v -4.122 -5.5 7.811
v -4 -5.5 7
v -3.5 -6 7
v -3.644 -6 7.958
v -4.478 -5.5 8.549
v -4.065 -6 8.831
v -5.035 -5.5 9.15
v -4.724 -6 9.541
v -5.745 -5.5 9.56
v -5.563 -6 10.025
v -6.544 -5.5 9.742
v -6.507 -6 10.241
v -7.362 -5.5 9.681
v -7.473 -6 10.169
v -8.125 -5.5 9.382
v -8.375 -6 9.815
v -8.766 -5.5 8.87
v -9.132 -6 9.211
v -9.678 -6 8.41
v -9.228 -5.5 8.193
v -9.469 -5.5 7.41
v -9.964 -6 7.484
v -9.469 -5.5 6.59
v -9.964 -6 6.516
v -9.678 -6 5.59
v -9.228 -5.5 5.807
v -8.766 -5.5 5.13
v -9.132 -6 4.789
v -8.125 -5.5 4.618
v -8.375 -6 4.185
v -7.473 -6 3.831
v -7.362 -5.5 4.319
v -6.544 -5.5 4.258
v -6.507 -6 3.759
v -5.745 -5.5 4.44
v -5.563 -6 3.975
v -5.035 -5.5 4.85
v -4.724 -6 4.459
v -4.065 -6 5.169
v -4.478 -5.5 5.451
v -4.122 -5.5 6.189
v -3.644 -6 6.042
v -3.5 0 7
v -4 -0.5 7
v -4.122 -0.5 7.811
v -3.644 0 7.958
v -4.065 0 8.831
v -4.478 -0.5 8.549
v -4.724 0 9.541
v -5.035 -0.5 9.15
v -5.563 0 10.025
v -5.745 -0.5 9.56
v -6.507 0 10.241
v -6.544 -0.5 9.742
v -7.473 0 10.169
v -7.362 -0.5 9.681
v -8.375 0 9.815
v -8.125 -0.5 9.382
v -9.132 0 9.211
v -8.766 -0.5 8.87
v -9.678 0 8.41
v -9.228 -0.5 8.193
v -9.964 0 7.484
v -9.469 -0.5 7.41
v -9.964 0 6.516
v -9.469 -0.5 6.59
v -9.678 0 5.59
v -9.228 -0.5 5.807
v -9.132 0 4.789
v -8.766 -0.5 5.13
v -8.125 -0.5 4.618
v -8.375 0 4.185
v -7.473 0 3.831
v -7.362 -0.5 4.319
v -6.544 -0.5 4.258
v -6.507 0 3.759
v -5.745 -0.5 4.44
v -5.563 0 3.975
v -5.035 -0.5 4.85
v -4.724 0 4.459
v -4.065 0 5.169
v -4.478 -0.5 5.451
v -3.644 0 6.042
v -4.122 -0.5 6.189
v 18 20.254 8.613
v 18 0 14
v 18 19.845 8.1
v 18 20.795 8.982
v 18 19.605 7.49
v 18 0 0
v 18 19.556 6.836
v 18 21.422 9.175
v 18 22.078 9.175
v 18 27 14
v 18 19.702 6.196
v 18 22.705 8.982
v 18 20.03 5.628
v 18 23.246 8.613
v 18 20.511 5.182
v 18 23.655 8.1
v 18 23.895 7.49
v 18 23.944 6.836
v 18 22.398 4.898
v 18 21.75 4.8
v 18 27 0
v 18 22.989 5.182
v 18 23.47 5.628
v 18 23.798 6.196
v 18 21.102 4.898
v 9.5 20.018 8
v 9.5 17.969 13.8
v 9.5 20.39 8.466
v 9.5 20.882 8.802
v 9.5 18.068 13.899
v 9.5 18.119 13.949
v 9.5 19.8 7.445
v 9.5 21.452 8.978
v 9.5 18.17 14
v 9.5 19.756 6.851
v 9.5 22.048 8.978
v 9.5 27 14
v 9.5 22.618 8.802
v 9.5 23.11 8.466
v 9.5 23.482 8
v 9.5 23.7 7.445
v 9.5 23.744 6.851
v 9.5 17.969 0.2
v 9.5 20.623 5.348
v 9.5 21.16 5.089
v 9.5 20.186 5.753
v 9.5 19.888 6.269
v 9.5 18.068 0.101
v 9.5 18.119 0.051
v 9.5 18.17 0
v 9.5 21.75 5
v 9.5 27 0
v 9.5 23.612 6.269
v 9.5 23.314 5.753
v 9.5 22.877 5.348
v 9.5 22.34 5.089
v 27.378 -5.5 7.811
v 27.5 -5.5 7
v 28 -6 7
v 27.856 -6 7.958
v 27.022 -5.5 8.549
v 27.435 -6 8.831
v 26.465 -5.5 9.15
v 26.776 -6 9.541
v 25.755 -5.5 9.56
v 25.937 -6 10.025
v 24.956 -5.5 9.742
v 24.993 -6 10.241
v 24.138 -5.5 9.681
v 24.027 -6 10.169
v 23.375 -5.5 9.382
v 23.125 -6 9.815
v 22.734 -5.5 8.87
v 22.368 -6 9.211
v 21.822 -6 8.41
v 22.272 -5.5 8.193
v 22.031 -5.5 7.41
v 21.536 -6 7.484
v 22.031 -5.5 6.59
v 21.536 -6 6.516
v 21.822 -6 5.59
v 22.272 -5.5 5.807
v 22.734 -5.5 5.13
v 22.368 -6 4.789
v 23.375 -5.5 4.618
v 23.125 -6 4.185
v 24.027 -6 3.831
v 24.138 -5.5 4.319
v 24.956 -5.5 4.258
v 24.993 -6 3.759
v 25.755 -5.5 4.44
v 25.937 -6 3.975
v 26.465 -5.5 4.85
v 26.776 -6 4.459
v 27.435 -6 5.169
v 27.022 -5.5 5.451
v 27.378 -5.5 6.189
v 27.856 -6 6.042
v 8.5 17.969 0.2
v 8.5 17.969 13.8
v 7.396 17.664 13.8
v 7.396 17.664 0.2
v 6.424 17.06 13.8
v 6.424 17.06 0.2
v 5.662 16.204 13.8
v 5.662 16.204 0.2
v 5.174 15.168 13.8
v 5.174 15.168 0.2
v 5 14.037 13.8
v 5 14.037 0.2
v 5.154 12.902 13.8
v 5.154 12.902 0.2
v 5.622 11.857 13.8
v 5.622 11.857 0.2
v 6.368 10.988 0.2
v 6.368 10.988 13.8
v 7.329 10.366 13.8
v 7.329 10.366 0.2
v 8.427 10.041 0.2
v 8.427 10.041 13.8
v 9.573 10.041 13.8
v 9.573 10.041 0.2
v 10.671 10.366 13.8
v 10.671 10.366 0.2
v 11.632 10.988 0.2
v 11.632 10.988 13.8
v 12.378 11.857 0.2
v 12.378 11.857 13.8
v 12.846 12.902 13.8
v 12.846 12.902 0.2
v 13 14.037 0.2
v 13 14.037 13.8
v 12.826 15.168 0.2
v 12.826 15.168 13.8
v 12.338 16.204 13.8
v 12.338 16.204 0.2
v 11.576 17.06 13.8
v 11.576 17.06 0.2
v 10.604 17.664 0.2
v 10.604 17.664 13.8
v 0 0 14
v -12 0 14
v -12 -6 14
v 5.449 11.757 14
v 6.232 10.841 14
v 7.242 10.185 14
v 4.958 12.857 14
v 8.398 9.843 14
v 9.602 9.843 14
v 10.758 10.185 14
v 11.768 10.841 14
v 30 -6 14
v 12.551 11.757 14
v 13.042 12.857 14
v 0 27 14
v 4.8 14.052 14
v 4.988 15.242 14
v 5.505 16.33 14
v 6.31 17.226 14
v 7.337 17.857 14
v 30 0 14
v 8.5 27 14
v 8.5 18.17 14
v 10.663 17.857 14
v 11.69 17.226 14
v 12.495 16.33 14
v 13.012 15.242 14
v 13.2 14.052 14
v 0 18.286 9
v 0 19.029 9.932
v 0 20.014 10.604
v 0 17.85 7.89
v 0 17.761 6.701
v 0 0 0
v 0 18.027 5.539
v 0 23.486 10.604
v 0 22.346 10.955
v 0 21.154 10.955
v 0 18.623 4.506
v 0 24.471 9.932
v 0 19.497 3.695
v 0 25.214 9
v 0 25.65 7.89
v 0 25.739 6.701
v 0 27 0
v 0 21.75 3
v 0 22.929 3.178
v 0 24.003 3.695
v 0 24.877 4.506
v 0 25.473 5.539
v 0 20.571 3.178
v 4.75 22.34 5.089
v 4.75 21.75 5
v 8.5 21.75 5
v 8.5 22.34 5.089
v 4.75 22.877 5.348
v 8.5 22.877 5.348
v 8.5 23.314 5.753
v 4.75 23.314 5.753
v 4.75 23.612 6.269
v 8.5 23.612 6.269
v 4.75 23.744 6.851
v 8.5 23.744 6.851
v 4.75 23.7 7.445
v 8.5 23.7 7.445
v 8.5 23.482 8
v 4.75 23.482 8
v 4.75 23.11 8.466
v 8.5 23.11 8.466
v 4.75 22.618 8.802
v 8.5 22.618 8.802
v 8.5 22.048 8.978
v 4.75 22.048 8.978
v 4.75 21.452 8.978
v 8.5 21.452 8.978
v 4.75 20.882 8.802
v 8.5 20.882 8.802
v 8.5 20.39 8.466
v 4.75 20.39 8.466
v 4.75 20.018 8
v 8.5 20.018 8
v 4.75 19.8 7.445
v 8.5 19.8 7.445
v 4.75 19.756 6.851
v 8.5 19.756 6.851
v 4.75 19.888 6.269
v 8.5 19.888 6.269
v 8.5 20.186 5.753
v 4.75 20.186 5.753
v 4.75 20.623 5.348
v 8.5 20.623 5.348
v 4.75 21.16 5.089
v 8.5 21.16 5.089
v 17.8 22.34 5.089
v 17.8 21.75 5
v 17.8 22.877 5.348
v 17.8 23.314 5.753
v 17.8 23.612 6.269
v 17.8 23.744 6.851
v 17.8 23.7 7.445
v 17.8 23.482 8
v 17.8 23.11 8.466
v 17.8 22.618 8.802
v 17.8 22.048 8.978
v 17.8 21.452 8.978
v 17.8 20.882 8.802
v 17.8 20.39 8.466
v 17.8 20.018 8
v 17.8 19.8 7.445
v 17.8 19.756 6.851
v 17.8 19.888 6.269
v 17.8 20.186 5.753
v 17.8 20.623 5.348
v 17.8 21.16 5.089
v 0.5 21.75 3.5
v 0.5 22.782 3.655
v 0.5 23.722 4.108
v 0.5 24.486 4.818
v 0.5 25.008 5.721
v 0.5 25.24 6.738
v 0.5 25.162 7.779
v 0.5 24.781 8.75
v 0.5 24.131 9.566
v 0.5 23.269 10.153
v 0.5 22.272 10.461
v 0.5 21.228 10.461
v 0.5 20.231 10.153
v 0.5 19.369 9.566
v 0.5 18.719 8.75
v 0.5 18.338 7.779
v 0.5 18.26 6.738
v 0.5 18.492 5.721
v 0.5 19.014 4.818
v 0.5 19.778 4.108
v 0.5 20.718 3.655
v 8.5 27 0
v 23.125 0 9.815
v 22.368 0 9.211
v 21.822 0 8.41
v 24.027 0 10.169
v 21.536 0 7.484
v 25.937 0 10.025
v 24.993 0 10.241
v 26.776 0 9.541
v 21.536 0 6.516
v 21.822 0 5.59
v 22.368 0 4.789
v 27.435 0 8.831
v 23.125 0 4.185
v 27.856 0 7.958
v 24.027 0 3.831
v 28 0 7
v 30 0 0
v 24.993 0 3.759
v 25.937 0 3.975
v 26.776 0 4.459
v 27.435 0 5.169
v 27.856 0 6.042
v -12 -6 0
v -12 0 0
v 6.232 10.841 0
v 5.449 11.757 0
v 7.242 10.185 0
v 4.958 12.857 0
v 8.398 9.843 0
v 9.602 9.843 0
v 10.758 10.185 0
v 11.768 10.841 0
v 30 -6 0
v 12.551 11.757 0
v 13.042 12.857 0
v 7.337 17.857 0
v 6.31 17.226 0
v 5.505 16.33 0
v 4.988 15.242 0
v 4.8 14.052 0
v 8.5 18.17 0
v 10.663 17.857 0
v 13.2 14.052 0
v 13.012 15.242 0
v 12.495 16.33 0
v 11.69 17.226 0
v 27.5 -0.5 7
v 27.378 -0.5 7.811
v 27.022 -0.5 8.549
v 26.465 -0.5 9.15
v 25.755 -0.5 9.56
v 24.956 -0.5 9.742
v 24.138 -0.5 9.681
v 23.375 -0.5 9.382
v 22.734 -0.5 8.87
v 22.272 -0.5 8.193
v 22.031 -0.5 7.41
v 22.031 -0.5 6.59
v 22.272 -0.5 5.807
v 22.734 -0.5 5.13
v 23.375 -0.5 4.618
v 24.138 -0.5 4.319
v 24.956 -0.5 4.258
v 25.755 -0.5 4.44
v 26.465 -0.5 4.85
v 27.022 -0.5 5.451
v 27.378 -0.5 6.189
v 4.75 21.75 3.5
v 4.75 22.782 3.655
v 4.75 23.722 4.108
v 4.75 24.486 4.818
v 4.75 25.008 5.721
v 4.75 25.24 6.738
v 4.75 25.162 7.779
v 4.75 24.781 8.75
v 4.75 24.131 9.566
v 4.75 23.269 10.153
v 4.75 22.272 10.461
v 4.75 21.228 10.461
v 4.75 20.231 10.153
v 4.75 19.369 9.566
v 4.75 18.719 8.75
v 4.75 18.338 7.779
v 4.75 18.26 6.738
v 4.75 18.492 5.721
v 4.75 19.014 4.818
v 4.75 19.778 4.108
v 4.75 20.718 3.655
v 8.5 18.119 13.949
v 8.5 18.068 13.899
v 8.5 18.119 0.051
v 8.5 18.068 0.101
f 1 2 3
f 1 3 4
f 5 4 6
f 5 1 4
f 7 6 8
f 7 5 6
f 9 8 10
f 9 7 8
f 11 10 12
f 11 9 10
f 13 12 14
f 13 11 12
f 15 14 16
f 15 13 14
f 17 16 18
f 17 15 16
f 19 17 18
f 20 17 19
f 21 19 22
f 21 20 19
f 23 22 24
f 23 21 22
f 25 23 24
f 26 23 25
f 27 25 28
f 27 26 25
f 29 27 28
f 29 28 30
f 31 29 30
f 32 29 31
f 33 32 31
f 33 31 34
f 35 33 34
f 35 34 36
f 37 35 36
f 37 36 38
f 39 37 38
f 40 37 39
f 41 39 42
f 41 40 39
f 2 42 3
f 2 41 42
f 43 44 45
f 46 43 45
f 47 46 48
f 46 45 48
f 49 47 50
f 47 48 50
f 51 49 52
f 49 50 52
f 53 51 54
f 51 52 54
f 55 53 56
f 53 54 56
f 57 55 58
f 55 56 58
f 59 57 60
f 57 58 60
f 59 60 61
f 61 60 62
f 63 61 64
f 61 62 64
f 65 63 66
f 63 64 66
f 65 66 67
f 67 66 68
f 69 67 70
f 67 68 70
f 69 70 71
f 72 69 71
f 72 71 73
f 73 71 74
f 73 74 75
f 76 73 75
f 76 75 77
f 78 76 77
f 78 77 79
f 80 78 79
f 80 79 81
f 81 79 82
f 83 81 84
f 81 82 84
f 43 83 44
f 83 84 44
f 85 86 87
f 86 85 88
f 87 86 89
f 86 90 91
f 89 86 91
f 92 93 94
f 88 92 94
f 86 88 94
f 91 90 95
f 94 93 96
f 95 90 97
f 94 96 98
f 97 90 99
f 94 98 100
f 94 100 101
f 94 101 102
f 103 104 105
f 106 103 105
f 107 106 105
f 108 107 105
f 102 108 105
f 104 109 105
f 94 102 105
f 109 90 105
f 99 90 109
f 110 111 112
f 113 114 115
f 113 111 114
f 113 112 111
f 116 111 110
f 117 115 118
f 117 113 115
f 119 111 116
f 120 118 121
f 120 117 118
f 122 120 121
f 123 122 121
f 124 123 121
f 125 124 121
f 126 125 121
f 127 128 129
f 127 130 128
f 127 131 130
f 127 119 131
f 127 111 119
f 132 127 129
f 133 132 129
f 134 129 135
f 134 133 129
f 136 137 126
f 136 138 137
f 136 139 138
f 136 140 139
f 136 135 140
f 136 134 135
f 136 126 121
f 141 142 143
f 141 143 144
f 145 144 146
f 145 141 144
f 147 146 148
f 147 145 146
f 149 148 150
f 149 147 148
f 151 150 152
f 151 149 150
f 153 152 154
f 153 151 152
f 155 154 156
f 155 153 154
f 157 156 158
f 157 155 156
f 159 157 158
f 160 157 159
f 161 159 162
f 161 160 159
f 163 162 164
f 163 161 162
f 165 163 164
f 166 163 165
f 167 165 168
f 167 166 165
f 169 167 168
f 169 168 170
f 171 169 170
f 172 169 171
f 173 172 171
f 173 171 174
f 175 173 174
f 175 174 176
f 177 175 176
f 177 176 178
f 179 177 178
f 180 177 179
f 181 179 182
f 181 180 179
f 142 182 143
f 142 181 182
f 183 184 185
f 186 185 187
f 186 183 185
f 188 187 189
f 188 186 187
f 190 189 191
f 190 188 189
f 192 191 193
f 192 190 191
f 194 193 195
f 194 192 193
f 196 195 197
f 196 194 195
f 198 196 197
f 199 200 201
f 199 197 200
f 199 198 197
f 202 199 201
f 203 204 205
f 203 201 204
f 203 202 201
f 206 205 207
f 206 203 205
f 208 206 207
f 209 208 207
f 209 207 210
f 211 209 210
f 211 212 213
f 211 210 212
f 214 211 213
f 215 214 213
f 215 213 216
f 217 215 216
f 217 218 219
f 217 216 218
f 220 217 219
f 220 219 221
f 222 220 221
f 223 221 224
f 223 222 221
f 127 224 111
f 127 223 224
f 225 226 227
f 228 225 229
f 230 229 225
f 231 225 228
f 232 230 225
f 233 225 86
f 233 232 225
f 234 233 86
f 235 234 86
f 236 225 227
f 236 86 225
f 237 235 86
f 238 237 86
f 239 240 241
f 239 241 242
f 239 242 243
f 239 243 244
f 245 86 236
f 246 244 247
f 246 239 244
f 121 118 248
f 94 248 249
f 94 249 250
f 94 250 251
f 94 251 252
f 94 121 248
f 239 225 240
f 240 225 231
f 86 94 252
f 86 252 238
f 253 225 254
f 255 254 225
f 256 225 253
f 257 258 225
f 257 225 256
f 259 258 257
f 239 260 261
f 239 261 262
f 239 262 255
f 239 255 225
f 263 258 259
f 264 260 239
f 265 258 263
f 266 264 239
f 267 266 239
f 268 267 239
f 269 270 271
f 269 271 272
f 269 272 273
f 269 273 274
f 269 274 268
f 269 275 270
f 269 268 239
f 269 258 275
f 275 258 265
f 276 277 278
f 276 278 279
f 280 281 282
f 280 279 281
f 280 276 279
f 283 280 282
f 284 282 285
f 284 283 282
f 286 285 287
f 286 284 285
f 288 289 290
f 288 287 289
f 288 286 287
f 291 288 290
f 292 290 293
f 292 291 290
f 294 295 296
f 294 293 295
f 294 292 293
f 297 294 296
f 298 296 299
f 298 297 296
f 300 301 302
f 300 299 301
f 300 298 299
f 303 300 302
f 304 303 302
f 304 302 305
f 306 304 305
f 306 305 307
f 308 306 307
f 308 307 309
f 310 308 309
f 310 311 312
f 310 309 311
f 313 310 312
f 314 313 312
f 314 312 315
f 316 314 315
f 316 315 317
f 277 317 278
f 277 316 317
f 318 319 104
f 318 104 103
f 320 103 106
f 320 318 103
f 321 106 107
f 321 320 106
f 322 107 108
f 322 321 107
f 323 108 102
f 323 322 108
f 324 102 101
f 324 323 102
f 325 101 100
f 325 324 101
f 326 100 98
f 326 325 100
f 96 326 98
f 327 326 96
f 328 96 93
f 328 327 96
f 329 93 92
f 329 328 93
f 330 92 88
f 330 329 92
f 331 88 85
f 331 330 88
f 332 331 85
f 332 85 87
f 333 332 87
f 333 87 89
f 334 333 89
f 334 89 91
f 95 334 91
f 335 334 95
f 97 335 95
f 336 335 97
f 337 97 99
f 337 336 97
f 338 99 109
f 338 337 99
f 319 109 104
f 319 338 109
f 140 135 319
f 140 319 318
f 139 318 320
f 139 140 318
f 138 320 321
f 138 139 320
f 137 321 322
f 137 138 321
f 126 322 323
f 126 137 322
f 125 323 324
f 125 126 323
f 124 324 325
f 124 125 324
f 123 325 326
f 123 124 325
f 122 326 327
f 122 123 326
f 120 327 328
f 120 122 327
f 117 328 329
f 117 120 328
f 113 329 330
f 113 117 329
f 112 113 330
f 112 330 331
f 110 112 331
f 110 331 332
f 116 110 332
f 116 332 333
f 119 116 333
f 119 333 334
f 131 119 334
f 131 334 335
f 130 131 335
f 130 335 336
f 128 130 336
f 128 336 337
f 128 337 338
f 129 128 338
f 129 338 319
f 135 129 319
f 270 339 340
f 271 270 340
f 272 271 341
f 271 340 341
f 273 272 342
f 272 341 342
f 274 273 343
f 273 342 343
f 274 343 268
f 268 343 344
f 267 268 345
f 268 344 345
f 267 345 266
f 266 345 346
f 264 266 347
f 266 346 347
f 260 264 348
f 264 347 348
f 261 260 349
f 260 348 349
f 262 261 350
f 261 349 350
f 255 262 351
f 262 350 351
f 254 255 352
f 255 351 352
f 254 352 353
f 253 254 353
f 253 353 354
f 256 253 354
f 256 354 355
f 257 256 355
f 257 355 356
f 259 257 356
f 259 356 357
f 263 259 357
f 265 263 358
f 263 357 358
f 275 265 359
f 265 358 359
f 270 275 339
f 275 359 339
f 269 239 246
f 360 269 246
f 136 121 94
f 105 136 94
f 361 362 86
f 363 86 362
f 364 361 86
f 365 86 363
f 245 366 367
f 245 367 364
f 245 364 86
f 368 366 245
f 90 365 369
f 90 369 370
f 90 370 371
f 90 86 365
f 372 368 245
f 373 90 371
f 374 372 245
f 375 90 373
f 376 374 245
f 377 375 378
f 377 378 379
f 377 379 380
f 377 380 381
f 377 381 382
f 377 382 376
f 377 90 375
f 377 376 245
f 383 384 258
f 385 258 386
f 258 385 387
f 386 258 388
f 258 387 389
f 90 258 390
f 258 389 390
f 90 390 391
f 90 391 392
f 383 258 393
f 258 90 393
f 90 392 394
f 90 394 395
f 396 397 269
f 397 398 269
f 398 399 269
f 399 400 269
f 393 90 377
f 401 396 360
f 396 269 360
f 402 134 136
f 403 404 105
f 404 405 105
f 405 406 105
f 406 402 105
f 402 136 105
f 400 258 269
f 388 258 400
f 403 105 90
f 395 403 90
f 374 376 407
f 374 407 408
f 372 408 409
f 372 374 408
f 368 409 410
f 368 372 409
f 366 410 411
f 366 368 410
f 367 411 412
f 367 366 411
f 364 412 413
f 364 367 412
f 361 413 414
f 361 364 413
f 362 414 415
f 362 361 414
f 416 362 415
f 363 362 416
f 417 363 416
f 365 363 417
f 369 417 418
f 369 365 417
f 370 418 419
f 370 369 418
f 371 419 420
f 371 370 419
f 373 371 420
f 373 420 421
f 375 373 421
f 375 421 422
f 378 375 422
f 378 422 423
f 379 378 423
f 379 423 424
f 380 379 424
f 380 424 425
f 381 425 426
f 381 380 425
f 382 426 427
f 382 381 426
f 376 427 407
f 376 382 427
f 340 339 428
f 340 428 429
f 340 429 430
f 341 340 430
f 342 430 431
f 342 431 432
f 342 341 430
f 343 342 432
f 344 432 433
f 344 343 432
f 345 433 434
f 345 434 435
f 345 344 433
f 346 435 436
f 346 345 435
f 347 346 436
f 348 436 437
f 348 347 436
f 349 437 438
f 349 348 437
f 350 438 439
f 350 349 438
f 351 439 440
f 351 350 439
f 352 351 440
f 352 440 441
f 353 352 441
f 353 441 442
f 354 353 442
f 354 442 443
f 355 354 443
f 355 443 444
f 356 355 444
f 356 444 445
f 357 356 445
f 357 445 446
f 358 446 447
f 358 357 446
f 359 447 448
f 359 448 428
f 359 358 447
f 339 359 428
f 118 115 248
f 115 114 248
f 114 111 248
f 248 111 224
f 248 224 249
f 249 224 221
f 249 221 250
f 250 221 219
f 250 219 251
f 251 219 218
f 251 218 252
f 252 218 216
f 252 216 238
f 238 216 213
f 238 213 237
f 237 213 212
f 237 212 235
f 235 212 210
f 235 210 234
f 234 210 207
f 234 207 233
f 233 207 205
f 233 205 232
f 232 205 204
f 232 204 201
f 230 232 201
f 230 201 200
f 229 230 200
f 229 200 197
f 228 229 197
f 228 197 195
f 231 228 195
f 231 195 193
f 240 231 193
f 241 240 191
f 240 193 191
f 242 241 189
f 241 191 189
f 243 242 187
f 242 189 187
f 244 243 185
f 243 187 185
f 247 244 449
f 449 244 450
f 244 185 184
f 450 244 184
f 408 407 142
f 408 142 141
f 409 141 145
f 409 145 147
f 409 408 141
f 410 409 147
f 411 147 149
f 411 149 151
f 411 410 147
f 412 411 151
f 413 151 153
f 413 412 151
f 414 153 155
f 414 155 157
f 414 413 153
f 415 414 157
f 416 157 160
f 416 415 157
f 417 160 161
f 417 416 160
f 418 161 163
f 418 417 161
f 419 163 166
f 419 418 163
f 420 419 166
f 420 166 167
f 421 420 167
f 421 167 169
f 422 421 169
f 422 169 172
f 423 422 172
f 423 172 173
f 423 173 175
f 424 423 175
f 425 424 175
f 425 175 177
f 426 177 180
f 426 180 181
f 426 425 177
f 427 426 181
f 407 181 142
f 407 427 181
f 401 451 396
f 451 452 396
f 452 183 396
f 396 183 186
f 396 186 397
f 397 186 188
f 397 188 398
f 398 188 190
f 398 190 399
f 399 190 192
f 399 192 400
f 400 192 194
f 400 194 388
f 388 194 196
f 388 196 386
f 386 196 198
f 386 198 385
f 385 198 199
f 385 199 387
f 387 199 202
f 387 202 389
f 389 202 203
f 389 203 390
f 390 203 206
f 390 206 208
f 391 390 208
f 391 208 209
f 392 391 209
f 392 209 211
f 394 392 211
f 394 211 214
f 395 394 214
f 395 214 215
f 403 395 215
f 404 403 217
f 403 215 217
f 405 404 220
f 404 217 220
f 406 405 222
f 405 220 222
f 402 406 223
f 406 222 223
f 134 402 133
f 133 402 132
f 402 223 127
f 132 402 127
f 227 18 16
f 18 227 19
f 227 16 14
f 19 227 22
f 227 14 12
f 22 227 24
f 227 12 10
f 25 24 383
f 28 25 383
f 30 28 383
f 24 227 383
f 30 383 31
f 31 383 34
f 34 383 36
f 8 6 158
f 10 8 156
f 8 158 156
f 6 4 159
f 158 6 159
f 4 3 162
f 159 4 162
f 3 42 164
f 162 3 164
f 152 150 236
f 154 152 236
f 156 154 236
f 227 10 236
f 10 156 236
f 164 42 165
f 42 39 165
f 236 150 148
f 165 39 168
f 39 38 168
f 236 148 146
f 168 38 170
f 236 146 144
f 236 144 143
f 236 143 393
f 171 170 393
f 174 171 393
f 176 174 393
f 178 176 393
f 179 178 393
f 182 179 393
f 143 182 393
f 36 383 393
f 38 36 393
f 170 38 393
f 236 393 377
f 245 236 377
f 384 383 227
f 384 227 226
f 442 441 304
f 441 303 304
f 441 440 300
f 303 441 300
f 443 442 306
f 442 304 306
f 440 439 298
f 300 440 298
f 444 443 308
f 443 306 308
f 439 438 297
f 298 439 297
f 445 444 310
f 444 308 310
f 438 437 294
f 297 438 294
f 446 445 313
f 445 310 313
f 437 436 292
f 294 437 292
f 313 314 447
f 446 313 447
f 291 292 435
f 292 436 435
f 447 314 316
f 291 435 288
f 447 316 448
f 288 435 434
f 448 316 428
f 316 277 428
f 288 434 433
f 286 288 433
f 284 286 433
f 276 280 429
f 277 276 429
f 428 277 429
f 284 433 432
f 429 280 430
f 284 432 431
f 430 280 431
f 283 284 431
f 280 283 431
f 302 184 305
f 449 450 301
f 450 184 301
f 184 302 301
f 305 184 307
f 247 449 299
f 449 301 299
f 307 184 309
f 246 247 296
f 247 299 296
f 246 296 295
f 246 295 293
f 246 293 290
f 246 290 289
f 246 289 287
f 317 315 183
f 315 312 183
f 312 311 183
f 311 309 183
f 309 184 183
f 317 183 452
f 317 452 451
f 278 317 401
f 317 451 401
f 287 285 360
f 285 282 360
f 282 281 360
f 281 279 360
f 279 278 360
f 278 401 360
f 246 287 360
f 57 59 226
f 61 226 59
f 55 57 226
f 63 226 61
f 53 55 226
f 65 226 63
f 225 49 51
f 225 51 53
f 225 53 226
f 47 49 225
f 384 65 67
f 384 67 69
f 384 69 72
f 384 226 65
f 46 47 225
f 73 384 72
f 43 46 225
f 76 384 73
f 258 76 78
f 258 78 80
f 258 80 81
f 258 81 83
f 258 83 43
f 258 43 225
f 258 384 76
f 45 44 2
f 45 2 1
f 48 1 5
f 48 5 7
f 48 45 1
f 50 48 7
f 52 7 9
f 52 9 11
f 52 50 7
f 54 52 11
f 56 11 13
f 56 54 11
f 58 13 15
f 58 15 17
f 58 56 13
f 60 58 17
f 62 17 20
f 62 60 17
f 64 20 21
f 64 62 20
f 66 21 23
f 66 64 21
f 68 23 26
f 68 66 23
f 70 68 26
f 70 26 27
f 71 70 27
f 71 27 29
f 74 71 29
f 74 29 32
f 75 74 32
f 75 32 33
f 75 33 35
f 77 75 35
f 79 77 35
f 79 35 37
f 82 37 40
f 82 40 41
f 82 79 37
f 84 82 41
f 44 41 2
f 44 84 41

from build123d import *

# Parameters (mm, degrees)
CYLINDER036_R      = 3.5
CYLINDER036_DEPTH  = 4.75
CYLINDER035_R      = 2
CYLINDER035_DEPTH  = 18
CYLINDER033_R      = 4
CYLINDER033_DEPTH  = 14
BOX012_W           = 1
BOX012_H           = 10
BOX012_DEPTH       = 14
CYLINDER034_R      = 2.75
CYLINDER034_DEPTH  = 6
CYLINDER032_R      = 2.75
CYLINDER032_DEPTH  = 6
BOX011_W           = 42
BOX011_H           = 6
BOX011_DEPTH       = 14
BOX013_W           = 18
BOX013_H           = 27
BOX013_DEPTH       = 14
CHAMFER001005_SIZE = 0.5
CHAMFER001003_SIZE = 0.2


with BuildPart() as cylinder036:
    # Cylinder036 → Cylinder036 (new body)
    with BuildSketch(Plane(origin=(0, 21.75, 7), x_dir=(0, 0, -1), z_dir=(1, 0, 0))):
        Circle(CYLINDER036_R)
    extrude(amount=CYLINDER036_DEPTH)


with BuildPart() as cylinder035:
    # Cylinder035 → Cylinder035 (new body)
    with BuildSketch(Plane(origin=(0, 21.75, 7), x_dir=(0, 0, -1), z_dir=(1, 0, 0))):
        Circle(CYLINDER035_R)
    extrude(amount=CYLINDER035_DEPTH)


with BuildPart() as cylinder033:
    # Cylinder033 → Cylinder033 (new body)
    with BuildSketch(Plane(origin=(9, 14, 0), x_dir=(1, 0, 0), z_dir=(0, 0, 1))):
        Circle(CYLINDER033_R)
    extrude(amount=CYLINDER033_DEPTH)


with BuildPart() as cube007:
    # Box012 → Box012 (new body)
    with BuildSketch(Plane(origin=(8.5, 17, 0), x_dir=(1, 0, 0), z_dir=(0, 0, 1))):
        with Locations((0.5, 5)):
            Rectangle(BOX012_W, BOX012_H)
    extrude(amount=BOX012_DEPTH)


with BuildPart() as cylinder034:
    # Cylinder034 → Cylinder034 (new body)
    with BuildSketch(Plane(origin=(24.75, 0, 7), x_dir=(1, 0, 0), z_dir=(0, -1, 0))):
        Circle(CYLINDER034_R)
    extrude(amount=CYLINDER034_DEPTH)


with BuildPart() as cylinder032:
    # Cylinder032 → Cylinder032 (new body)
    with BuildSketch(Plane(origin=(-6.75, 0, 7), x_dir=(1, 0, 0), z_dir=(0, -1, 0))):
        Circle(CYLINDER032_R)
    extrude(amount=CYLINDER032_DEPTH)


with BuildPart() as cube006:
    # Box011 → Box011 (new body)
    with BuildSketch(Plane(origin=(-12, -6, 0), x_dir=(1, 0, 0), z_dir=(0, 0, 1))):
        with Locations((21, 3)):
            Rectangle(BOX011_W, BOX011_H)
    extrude(amount=BOX011_DEPTH)


with BuildPart() as chamfer001003:
    # Box013 → Box013 (new body)
    with BuildSketch(Plane.XY):
        with Locations((9, 13.5)):
            Rectangle(BOX013_W, BOX013_H)
    extrude(amount=BOX013_DEPTH)

    # Fusion007005: union Cube006
    add(cube006.part)

    # Cut002021: cut Cylinder032
    add(cylinder032.part, mode=Mode.SUBTRACT)

    # Cut002017: cut Cylinder034
    add(cylinder034.part, mode=Mode.SUBTRACT)

    # Cut002022: cut Cube007
    add(cube007.part, mode=Mode.SUBTRACT)

    # Cut002018: cut Cylinder033
    add(cylinder033.part, mode=Mode.SUBTRACT)

    # Cut002019: cut Cylinder035
    add(cylinder035.part, mode=Mode.SUBTRACT)

    # Cut002020: cut Cylinder036
    add(cylinder036.part, mode=Mode.SUBTRACT)

    # Chamfer001005
    chamfer001005_edges = [chamfer001003.edges().sort_by_distance(p)[0] for p in [
        (0, 21.75, 10.5),
        (-9.5, 0, 7),
        (22, 0, 7),
        (-9.5, -6, 7),
        (22, -6, 7),
    ]]
    chamfer(chamfer001005_edges, length=CHAMFER001005_SIZE)

    # Chamfer001003
    chamfer001003_edges = [chamfer001003.edges().sort_by_distance(p)[0] for p in [
        (6.354249, 11, 14),
        (12, 16.645751, 14),
        (6.354249, 11, 0),
        (12, 16.645751, 0),
        (18, 21.75, 9),
    ]]
    chamfer(chamfer001003_edges, length=CHAMFER001003_SIZE)


solid = chamfer001003.part
